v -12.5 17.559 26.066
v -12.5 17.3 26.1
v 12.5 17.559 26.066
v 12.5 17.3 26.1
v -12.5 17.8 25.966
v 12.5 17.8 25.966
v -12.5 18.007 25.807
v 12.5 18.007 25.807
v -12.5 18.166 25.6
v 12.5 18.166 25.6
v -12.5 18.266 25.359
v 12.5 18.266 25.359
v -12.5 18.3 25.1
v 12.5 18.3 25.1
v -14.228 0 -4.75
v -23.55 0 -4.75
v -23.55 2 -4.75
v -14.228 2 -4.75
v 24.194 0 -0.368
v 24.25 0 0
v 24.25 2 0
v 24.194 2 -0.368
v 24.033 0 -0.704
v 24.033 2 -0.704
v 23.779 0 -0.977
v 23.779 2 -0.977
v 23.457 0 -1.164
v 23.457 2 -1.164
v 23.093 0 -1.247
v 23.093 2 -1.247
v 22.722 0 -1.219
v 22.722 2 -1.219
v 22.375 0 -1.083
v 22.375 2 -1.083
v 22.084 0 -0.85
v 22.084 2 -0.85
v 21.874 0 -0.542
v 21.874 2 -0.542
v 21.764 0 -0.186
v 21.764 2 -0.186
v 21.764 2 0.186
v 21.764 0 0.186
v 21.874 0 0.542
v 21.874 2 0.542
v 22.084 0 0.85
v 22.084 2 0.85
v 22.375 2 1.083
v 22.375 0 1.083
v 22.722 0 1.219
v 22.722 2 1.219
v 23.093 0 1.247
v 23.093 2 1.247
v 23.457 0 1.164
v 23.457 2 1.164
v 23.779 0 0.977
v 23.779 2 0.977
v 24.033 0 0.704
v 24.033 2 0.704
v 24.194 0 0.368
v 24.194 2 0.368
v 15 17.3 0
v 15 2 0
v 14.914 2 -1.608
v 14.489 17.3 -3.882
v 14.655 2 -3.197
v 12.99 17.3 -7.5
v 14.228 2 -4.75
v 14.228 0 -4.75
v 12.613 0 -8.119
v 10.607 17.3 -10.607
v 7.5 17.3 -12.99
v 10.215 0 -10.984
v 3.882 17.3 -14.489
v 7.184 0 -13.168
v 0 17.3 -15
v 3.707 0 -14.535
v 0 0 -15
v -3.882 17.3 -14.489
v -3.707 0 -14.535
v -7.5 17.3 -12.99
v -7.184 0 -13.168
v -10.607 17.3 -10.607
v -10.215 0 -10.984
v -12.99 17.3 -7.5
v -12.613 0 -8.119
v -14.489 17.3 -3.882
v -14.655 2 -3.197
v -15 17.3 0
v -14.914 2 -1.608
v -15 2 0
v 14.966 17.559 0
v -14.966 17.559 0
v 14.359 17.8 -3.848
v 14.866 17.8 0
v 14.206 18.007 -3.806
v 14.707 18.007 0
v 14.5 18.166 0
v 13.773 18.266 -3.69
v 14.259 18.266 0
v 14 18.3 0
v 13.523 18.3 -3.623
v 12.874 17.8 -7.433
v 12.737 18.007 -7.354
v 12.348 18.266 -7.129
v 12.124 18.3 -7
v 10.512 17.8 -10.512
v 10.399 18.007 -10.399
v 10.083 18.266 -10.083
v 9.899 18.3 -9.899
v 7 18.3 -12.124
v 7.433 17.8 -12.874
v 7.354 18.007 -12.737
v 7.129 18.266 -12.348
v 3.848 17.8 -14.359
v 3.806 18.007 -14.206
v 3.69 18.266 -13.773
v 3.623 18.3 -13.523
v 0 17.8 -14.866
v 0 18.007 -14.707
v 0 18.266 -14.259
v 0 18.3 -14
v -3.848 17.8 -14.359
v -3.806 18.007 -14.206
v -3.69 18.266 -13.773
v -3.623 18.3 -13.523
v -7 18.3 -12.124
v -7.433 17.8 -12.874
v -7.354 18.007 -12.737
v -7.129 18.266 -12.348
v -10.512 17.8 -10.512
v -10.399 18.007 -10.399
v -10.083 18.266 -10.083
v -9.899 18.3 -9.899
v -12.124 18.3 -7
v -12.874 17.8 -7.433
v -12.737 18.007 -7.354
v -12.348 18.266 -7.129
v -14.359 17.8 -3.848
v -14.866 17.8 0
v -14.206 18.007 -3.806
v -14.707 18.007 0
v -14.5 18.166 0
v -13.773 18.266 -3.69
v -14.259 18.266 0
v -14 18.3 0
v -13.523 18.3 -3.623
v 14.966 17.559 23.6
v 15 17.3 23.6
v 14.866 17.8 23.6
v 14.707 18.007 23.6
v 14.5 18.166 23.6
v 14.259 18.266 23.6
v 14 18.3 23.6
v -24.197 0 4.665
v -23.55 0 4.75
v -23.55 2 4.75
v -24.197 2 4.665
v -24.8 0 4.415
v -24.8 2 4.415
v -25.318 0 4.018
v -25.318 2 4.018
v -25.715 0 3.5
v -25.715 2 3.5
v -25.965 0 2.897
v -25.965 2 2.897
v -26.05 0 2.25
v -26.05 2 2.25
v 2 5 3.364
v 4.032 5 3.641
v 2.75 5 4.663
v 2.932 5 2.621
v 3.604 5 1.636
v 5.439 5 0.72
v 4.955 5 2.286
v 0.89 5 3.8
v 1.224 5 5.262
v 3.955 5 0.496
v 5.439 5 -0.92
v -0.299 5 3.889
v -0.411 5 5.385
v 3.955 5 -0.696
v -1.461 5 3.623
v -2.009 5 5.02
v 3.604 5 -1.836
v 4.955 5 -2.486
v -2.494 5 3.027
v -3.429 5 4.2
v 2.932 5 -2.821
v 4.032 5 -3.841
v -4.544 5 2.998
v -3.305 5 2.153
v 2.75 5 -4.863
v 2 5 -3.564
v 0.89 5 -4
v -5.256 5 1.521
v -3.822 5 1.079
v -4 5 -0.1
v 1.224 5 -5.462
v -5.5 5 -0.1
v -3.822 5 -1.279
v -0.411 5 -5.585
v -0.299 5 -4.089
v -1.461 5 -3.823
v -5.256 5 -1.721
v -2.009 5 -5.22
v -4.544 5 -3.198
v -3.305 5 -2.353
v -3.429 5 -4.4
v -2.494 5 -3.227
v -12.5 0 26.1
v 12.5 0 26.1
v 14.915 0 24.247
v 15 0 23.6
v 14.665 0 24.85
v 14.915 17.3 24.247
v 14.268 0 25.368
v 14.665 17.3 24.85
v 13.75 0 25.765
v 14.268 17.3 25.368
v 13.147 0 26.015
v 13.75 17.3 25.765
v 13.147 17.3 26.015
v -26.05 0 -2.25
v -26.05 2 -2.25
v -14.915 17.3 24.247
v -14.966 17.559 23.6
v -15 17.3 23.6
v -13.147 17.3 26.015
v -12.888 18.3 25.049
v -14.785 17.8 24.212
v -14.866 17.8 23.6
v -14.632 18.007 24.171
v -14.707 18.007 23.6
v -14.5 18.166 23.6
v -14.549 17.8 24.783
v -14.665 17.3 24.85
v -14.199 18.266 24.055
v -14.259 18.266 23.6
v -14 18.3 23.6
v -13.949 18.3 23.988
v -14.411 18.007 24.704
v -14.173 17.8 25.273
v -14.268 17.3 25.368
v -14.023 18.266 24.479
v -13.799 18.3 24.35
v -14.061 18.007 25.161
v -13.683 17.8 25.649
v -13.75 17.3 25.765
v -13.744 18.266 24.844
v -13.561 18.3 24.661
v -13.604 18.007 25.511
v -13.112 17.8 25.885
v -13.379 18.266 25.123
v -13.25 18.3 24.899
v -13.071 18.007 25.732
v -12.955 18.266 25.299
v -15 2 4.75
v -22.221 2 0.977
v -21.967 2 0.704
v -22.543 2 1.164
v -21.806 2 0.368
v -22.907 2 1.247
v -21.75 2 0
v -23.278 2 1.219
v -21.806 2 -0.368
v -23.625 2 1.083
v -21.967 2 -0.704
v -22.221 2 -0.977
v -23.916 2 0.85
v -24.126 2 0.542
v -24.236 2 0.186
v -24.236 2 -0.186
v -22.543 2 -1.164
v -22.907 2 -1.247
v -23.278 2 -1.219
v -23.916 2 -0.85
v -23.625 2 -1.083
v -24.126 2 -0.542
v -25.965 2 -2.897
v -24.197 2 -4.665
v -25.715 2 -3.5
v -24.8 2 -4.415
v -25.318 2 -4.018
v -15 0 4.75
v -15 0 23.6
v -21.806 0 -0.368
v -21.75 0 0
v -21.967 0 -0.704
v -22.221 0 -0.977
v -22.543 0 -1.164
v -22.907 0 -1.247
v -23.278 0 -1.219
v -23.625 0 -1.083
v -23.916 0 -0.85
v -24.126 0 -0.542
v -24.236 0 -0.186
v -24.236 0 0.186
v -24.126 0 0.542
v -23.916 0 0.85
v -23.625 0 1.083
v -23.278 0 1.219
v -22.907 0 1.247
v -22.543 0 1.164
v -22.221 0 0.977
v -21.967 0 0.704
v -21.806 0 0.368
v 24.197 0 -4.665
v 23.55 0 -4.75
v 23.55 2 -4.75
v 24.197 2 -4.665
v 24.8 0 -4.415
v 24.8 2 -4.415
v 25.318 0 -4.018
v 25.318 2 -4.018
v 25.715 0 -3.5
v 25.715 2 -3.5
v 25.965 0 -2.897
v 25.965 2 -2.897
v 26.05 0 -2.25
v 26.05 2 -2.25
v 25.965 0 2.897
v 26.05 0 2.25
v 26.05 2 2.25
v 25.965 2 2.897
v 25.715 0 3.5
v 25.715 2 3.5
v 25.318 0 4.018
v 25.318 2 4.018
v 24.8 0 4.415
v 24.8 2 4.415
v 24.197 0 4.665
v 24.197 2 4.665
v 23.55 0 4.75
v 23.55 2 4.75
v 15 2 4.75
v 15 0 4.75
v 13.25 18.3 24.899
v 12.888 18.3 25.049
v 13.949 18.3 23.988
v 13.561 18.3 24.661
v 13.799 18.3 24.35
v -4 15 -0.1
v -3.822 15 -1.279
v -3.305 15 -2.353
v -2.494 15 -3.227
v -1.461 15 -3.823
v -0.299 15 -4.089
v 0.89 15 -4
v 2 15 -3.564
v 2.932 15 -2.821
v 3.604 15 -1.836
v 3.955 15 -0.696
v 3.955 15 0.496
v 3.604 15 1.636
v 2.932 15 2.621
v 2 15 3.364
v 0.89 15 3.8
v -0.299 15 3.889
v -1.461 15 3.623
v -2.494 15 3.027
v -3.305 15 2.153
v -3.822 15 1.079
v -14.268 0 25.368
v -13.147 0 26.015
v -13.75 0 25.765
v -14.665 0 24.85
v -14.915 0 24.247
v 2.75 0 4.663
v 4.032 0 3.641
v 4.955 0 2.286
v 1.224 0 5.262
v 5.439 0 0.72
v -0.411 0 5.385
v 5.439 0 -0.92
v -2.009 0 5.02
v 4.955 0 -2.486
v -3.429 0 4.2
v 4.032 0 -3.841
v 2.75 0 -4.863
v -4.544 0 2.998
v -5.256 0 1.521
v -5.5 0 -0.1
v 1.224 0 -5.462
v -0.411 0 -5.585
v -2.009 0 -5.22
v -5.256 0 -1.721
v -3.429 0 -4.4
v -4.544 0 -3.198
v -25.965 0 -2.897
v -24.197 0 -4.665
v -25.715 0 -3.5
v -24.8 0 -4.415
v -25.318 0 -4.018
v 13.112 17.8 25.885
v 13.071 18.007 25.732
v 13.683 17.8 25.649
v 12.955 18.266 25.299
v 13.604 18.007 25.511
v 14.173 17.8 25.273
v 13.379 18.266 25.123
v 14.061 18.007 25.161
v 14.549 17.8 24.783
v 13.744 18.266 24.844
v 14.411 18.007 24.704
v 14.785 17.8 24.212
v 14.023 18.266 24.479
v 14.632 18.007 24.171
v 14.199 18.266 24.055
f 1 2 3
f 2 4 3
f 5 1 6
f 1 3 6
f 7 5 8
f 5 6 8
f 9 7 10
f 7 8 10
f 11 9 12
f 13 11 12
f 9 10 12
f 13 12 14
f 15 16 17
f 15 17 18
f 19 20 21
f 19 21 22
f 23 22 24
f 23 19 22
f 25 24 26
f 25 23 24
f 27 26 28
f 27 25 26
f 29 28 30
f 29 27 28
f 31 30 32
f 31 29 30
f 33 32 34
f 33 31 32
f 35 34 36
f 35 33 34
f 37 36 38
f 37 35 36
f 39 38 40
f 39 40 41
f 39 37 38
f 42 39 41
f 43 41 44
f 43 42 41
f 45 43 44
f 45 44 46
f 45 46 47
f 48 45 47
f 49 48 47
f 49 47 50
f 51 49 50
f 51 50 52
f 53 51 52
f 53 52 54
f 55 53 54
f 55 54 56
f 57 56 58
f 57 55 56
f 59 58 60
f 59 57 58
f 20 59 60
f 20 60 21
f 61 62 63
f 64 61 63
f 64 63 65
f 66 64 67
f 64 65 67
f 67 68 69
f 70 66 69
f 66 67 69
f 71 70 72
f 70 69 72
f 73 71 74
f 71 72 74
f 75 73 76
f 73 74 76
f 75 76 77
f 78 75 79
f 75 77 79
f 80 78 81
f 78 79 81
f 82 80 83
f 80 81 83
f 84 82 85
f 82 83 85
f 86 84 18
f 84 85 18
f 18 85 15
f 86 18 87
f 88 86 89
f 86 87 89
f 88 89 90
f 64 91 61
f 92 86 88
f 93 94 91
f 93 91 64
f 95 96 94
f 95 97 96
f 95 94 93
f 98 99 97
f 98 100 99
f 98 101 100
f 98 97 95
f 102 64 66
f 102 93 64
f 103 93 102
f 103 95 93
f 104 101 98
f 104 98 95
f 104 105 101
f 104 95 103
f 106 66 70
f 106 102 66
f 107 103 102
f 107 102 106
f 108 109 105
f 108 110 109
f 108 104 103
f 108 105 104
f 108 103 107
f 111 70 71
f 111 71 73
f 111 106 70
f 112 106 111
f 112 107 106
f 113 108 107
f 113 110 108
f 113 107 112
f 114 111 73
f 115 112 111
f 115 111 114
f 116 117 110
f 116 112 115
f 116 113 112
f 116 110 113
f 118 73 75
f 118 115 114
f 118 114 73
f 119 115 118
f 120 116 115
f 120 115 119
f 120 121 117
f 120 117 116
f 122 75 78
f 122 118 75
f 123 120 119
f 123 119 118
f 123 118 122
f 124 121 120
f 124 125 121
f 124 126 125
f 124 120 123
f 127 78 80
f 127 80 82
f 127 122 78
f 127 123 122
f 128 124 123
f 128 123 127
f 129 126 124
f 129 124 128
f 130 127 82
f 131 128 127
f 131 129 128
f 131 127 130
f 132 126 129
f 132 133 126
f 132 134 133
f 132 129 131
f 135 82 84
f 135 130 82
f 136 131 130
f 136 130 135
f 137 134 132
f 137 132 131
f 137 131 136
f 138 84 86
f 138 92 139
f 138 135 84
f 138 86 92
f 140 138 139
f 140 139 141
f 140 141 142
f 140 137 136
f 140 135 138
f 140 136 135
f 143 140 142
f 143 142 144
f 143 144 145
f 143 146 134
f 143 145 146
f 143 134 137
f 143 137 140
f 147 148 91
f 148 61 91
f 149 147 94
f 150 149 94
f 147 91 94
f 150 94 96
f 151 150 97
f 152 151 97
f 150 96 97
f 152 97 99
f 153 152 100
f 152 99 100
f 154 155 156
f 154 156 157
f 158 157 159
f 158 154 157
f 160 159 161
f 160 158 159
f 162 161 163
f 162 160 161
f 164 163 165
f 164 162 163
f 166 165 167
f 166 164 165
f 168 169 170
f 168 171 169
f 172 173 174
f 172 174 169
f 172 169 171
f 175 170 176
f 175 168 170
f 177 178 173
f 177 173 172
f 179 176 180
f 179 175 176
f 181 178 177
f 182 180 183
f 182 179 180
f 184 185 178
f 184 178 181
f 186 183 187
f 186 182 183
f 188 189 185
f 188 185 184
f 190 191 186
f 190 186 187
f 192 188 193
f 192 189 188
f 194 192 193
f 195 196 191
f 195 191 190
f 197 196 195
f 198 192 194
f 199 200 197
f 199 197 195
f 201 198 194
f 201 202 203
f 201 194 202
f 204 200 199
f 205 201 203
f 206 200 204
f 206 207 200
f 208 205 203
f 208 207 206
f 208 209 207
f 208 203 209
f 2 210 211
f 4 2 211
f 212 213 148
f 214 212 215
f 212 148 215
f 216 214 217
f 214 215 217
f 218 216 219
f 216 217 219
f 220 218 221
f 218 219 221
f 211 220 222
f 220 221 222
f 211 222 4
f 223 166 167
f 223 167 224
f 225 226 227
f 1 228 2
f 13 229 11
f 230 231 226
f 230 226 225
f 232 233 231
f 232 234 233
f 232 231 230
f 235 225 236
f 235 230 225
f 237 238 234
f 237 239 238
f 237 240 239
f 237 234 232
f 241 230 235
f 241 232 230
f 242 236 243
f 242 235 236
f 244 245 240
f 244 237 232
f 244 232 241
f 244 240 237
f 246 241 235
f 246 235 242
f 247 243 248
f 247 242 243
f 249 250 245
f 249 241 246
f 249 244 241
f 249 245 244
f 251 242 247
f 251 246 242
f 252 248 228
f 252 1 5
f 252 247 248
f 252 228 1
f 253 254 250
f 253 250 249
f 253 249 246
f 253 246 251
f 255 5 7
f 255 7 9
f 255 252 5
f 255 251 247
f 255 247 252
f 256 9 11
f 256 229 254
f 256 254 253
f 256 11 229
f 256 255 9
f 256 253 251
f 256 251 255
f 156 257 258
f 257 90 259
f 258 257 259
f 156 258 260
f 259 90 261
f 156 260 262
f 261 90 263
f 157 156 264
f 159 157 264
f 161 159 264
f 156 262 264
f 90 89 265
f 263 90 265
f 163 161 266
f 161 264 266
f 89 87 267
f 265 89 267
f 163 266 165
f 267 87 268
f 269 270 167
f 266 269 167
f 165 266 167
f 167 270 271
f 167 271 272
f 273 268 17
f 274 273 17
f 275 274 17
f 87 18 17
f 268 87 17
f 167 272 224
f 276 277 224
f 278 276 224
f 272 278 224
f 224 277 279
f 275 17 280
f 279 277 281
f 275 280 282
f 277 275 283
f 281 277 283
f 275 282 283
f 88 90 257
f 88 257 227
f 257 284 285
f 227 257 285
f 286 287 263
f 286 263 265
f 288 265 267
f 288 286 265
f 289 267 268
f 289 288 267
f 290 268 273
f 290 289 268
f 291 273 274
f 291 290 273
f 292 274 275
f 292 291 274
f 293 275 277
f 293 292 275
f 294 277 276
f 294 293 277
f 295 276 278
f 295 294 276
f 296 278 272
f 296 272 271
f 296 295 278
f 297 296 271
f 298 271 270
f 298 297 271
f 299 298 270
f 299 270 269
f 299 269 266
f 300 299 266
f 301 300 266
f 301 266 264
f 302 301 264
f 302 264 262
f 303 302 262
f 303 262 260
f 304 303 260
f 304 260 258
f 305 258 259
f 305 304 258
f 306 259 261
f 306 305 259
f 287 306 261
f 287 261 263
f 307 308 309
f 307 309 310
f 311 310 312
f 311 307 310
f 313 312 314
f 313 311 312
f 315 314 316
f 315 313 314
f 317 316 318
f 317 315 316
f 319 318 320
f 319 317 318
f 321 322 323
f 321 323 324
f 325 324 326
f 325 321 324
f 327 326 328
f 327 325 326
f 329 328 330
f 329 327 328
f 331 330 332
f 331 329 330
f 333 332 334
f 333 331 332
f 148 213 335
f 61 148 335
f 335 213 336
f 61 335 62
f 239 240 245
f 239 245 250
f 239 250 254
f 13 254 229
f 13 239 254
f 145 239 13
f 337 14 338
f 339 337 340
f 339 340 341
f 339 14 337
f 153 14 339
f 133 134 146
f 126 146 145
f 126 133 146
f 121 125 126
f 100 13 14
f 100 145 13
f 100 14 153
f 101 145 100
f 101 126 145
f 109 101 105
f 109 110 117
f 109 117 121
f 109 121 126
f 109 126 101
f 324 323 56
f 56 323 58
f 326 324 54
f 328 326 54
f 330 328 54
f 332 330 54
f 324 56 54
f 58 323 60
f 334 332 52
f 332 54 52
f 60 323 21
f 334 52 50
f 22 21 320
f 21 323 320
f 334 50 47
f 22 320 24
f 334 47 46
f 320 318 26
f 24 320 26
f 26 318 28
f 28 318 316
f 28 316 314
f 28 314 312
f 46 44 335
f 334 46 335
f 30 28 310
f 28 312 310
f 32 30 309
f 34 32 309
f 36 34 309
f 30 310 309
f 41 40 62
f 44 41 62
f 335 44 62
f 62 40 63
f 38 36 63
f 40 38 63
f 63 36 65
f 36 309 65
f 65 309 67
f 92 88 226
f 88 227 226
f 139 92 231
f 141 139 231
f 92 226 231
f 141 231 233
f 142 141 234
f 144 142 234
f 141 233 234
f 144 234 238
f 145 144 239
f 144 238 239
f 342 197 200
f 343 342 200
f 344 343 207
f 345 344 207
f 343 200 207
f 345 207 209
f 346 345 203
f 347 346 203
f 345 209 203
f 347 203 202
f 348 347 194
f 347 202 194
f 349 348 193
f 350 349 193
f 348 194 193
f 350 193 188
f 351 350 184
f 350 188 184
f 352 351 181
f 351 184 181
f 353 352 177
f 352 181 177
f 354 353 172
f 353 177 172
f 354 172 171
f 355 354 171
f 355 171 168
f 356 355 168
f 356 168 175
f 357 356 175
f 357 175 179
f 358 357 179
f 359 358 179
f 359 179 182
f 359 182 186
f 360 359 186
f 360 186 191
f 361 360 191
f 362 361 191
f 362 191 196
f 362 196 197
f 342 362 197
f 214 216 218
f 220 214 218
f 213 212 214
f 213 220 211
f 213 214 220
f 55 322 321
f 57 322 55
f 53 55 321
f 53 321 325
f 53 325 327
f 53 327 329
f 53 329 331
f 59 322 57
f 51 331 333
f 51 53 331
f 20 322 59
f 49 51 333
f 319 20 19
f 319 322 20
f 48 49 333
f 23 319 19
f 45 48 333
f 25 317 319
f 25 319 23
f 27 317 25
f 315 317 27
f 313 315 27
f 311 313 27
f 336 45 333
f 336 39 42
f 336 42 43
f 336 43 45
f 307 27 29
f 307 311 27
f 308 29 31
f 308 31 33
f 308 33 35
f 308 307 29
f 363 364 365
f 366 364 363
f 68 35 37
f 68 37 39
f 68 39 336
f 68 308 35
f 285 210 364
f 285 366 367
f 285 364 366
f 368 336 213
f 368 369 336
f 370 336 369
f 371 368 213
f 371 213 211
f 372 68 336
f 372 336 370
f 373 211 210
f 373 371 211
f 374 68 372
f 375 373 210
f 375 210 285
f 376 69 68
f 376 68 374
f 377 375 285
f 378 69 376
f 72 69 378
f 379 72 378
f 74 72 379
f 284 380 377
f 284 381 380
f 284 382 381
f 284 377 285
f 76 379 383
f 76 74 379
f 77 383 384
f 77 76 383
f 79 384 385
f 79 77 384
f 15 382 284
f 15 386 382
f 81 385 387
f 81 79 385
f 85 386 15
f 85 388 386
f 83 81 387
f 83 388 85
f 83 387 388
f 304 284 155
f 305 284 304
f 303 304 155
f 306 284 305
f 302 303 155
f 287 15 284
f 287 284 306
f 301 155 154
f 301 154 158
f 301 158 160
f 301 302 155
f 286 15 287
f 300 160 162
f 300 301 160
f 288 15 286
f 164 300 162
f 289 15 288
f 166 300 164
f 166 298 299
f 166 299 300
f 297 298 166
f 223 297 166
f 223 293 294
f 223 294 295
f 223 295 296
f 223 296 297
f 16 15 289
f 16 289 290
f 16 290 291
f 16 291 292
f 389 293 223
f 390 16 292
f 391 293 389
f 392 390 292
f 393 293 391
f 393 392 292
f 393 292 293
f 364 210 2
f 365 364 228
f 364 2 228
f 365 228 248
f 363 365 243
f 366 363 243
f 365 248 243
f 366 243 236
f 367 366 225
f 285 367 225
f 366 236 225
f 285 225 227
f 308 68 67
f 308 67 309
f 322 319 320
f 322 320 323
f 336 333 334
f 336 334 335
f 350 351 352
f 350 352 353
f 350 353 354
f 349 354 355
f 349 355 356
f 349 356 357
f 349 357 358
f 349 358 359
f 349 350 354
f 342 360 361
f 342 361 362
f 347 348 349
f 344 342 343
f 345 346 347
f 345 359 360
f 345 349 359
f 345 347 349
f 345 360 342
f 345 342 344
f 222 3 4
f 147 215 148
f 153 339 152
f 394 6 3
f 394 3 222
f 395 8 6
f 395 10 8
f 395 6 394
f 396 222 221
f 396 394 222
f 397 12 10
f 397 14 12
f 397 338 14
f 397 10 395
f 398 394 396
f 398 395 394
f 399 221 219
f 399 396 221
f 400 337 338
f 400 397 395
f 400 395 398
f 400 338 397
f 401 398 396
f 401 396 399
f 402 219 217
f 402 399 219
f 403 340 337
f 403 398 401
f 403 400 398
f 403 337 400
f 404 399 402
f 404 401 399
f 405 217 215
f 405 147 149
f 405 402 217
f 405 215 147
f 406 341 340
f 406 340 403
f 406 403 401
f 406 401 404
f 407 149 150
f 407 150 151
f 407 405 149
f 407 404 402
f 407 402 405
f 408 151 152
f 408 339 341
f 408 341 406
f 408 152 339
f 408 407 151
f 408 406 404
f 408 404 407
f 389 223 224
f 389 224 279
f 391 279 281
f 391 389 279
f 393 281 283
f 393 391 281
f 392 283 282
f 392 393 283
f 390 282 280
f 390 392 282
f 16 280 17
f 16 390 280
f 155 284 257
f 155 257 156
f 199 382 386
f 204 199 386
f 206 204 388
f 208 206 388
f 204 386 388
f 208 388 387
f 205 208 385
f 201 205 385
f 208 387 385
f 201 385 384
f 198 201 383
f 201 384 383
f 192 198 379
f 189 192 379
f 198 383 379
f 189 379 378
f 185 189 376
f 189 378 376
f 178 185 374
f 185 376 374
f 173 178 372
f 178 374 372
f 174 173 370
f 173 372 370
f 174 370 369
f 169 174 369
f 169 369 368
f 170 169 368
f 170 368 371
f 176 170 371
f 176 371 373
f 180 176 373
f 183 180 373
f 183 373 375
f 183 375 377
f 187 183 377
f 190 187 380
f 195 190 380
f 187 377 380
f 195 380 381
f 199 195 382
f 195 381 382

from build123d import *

# Parameters (mm, degrees)
BOSS_EXTRUDE1_DEPTH = 18.3
SKETCH2_R           = 1.25
BOSS_EXTRUDE2_DEPTH = 2
FILLET1_R           = 2.5
SKETCH3_R           = 5.5
CUT_EXTRUDE2_DEPTH  = 5
SKETCH5_R           = 4
CUT_EXTRUDE3_DEPTH  = 15
FILLET2_R           = 1


with BuildPart() as part:
    # Sketch1 → Boss-Extrude1 (new body)
    with BuildSketch(Plane(origin=(0, 0, 0), x_dir=(1, 0, 0), z_dir=(0, 1, 0))):
        with BuildLine():
            Line((-15, 0), (-15, -26.1))
            Line((-15, -26.1), (15, -26.1))
            Line((15, -26.1), (15, 0))
            ThreePointArc((15, 0), (0, 15), (-15, 0))
        make_face()
    extrude(amount=BOSS_EXTRUDE1_DEPTH)

    # Sketch2 → Boss-Extrude2 (add)
    with BuildSketch(Plane(origin=(0, 0, 0), x_dir=(1, 0, 0), z_dir=(0, 1, 0))):
        with BuildLine():
            Line((23.55, -4.75), (-23.55, -4.75))
            ThreePointArc((-23.55, -4.75), (-25.317766953, -4.017766953), (-26.05, -2.25))
            Line((-26.05, -2.25), (-26.05, 2.25))
            ThreePointArc((-26.05, 2.25), (-25.317766953, 4.017766953), (-23.55, 4.75))
            Line((-23.55, 4.75), (23.55, 4.75))
            ThreePointArc((23.55, 4.75), (25.317766953, 4.017766953), (26.05, 2.25))
            Line((26.05, 2.25), (26.05, -2.25))
            ThreePointArc((26.05, -2.25), (25.317766953, -4.017766953), (23.55, -4.75))
        make_face()
        with Locations((-23, 0)):
            Circle(SKETCH2_R, mode=Mode.SUBTRACT)
        with Locations((23, 0)):
            Circle(SKETCH2_R, mode=Mode.SUBTRACT)
    extrude(amount=BOSS_EXTRUDE2_DEPTH)

    # Fillet1
    fillet1_edges = [part.edges().sort_by_distance(p)[0] for p in [
        (15, 9.15, 26.1),
        (-15, 9.15, 26.1),
    ]]
    fillet(fillet1_edges, radius=FILLET1_R)

    # Sketch3 → Cut-Extrude2 (cut)
    with BuildSketch(Plane(origin=(0, 0, 0), x_dir=(-1, 0, 0), z_dir=(0, -1, 0))):
        with Locations((0, 0.1)):
            Circle(SKETCH3_R)
    extrude(amount=-CUT_EXTRUDE2_DEPTH, mode=Mode.SUBTRACT)

    # Sketch5 → Cut-Extrude3 (cut)
    with BuildSketch(Plane(origin=(0, 0, 0), x_dir=(-1, 0, 0), z_dir=(0, -1, 0))):
        with Locations((0, 0.1)):
            Circle(SKETCH5_R)
    extrude(amount=-CUT_EXTRUDE3_DEPTH, mode=Mode.SUBTRACT)

    # Fillet2
    fillet2_edges = [part.edges().sort_by_distance(p)[0] for p in [
        (0, 18.3, -15),
        (0, 18.3, 26.1),
        (15, 18.3, 11.8),
        (14.267766953, 18.3, 25.367766953),
        (-14.267766953, 18.3, 25.367766953),
        (-15, 18.3, 11.8),
    ]]
    fillet(fillet2_edges, radius=FILLET2_R)


solid = part.part
